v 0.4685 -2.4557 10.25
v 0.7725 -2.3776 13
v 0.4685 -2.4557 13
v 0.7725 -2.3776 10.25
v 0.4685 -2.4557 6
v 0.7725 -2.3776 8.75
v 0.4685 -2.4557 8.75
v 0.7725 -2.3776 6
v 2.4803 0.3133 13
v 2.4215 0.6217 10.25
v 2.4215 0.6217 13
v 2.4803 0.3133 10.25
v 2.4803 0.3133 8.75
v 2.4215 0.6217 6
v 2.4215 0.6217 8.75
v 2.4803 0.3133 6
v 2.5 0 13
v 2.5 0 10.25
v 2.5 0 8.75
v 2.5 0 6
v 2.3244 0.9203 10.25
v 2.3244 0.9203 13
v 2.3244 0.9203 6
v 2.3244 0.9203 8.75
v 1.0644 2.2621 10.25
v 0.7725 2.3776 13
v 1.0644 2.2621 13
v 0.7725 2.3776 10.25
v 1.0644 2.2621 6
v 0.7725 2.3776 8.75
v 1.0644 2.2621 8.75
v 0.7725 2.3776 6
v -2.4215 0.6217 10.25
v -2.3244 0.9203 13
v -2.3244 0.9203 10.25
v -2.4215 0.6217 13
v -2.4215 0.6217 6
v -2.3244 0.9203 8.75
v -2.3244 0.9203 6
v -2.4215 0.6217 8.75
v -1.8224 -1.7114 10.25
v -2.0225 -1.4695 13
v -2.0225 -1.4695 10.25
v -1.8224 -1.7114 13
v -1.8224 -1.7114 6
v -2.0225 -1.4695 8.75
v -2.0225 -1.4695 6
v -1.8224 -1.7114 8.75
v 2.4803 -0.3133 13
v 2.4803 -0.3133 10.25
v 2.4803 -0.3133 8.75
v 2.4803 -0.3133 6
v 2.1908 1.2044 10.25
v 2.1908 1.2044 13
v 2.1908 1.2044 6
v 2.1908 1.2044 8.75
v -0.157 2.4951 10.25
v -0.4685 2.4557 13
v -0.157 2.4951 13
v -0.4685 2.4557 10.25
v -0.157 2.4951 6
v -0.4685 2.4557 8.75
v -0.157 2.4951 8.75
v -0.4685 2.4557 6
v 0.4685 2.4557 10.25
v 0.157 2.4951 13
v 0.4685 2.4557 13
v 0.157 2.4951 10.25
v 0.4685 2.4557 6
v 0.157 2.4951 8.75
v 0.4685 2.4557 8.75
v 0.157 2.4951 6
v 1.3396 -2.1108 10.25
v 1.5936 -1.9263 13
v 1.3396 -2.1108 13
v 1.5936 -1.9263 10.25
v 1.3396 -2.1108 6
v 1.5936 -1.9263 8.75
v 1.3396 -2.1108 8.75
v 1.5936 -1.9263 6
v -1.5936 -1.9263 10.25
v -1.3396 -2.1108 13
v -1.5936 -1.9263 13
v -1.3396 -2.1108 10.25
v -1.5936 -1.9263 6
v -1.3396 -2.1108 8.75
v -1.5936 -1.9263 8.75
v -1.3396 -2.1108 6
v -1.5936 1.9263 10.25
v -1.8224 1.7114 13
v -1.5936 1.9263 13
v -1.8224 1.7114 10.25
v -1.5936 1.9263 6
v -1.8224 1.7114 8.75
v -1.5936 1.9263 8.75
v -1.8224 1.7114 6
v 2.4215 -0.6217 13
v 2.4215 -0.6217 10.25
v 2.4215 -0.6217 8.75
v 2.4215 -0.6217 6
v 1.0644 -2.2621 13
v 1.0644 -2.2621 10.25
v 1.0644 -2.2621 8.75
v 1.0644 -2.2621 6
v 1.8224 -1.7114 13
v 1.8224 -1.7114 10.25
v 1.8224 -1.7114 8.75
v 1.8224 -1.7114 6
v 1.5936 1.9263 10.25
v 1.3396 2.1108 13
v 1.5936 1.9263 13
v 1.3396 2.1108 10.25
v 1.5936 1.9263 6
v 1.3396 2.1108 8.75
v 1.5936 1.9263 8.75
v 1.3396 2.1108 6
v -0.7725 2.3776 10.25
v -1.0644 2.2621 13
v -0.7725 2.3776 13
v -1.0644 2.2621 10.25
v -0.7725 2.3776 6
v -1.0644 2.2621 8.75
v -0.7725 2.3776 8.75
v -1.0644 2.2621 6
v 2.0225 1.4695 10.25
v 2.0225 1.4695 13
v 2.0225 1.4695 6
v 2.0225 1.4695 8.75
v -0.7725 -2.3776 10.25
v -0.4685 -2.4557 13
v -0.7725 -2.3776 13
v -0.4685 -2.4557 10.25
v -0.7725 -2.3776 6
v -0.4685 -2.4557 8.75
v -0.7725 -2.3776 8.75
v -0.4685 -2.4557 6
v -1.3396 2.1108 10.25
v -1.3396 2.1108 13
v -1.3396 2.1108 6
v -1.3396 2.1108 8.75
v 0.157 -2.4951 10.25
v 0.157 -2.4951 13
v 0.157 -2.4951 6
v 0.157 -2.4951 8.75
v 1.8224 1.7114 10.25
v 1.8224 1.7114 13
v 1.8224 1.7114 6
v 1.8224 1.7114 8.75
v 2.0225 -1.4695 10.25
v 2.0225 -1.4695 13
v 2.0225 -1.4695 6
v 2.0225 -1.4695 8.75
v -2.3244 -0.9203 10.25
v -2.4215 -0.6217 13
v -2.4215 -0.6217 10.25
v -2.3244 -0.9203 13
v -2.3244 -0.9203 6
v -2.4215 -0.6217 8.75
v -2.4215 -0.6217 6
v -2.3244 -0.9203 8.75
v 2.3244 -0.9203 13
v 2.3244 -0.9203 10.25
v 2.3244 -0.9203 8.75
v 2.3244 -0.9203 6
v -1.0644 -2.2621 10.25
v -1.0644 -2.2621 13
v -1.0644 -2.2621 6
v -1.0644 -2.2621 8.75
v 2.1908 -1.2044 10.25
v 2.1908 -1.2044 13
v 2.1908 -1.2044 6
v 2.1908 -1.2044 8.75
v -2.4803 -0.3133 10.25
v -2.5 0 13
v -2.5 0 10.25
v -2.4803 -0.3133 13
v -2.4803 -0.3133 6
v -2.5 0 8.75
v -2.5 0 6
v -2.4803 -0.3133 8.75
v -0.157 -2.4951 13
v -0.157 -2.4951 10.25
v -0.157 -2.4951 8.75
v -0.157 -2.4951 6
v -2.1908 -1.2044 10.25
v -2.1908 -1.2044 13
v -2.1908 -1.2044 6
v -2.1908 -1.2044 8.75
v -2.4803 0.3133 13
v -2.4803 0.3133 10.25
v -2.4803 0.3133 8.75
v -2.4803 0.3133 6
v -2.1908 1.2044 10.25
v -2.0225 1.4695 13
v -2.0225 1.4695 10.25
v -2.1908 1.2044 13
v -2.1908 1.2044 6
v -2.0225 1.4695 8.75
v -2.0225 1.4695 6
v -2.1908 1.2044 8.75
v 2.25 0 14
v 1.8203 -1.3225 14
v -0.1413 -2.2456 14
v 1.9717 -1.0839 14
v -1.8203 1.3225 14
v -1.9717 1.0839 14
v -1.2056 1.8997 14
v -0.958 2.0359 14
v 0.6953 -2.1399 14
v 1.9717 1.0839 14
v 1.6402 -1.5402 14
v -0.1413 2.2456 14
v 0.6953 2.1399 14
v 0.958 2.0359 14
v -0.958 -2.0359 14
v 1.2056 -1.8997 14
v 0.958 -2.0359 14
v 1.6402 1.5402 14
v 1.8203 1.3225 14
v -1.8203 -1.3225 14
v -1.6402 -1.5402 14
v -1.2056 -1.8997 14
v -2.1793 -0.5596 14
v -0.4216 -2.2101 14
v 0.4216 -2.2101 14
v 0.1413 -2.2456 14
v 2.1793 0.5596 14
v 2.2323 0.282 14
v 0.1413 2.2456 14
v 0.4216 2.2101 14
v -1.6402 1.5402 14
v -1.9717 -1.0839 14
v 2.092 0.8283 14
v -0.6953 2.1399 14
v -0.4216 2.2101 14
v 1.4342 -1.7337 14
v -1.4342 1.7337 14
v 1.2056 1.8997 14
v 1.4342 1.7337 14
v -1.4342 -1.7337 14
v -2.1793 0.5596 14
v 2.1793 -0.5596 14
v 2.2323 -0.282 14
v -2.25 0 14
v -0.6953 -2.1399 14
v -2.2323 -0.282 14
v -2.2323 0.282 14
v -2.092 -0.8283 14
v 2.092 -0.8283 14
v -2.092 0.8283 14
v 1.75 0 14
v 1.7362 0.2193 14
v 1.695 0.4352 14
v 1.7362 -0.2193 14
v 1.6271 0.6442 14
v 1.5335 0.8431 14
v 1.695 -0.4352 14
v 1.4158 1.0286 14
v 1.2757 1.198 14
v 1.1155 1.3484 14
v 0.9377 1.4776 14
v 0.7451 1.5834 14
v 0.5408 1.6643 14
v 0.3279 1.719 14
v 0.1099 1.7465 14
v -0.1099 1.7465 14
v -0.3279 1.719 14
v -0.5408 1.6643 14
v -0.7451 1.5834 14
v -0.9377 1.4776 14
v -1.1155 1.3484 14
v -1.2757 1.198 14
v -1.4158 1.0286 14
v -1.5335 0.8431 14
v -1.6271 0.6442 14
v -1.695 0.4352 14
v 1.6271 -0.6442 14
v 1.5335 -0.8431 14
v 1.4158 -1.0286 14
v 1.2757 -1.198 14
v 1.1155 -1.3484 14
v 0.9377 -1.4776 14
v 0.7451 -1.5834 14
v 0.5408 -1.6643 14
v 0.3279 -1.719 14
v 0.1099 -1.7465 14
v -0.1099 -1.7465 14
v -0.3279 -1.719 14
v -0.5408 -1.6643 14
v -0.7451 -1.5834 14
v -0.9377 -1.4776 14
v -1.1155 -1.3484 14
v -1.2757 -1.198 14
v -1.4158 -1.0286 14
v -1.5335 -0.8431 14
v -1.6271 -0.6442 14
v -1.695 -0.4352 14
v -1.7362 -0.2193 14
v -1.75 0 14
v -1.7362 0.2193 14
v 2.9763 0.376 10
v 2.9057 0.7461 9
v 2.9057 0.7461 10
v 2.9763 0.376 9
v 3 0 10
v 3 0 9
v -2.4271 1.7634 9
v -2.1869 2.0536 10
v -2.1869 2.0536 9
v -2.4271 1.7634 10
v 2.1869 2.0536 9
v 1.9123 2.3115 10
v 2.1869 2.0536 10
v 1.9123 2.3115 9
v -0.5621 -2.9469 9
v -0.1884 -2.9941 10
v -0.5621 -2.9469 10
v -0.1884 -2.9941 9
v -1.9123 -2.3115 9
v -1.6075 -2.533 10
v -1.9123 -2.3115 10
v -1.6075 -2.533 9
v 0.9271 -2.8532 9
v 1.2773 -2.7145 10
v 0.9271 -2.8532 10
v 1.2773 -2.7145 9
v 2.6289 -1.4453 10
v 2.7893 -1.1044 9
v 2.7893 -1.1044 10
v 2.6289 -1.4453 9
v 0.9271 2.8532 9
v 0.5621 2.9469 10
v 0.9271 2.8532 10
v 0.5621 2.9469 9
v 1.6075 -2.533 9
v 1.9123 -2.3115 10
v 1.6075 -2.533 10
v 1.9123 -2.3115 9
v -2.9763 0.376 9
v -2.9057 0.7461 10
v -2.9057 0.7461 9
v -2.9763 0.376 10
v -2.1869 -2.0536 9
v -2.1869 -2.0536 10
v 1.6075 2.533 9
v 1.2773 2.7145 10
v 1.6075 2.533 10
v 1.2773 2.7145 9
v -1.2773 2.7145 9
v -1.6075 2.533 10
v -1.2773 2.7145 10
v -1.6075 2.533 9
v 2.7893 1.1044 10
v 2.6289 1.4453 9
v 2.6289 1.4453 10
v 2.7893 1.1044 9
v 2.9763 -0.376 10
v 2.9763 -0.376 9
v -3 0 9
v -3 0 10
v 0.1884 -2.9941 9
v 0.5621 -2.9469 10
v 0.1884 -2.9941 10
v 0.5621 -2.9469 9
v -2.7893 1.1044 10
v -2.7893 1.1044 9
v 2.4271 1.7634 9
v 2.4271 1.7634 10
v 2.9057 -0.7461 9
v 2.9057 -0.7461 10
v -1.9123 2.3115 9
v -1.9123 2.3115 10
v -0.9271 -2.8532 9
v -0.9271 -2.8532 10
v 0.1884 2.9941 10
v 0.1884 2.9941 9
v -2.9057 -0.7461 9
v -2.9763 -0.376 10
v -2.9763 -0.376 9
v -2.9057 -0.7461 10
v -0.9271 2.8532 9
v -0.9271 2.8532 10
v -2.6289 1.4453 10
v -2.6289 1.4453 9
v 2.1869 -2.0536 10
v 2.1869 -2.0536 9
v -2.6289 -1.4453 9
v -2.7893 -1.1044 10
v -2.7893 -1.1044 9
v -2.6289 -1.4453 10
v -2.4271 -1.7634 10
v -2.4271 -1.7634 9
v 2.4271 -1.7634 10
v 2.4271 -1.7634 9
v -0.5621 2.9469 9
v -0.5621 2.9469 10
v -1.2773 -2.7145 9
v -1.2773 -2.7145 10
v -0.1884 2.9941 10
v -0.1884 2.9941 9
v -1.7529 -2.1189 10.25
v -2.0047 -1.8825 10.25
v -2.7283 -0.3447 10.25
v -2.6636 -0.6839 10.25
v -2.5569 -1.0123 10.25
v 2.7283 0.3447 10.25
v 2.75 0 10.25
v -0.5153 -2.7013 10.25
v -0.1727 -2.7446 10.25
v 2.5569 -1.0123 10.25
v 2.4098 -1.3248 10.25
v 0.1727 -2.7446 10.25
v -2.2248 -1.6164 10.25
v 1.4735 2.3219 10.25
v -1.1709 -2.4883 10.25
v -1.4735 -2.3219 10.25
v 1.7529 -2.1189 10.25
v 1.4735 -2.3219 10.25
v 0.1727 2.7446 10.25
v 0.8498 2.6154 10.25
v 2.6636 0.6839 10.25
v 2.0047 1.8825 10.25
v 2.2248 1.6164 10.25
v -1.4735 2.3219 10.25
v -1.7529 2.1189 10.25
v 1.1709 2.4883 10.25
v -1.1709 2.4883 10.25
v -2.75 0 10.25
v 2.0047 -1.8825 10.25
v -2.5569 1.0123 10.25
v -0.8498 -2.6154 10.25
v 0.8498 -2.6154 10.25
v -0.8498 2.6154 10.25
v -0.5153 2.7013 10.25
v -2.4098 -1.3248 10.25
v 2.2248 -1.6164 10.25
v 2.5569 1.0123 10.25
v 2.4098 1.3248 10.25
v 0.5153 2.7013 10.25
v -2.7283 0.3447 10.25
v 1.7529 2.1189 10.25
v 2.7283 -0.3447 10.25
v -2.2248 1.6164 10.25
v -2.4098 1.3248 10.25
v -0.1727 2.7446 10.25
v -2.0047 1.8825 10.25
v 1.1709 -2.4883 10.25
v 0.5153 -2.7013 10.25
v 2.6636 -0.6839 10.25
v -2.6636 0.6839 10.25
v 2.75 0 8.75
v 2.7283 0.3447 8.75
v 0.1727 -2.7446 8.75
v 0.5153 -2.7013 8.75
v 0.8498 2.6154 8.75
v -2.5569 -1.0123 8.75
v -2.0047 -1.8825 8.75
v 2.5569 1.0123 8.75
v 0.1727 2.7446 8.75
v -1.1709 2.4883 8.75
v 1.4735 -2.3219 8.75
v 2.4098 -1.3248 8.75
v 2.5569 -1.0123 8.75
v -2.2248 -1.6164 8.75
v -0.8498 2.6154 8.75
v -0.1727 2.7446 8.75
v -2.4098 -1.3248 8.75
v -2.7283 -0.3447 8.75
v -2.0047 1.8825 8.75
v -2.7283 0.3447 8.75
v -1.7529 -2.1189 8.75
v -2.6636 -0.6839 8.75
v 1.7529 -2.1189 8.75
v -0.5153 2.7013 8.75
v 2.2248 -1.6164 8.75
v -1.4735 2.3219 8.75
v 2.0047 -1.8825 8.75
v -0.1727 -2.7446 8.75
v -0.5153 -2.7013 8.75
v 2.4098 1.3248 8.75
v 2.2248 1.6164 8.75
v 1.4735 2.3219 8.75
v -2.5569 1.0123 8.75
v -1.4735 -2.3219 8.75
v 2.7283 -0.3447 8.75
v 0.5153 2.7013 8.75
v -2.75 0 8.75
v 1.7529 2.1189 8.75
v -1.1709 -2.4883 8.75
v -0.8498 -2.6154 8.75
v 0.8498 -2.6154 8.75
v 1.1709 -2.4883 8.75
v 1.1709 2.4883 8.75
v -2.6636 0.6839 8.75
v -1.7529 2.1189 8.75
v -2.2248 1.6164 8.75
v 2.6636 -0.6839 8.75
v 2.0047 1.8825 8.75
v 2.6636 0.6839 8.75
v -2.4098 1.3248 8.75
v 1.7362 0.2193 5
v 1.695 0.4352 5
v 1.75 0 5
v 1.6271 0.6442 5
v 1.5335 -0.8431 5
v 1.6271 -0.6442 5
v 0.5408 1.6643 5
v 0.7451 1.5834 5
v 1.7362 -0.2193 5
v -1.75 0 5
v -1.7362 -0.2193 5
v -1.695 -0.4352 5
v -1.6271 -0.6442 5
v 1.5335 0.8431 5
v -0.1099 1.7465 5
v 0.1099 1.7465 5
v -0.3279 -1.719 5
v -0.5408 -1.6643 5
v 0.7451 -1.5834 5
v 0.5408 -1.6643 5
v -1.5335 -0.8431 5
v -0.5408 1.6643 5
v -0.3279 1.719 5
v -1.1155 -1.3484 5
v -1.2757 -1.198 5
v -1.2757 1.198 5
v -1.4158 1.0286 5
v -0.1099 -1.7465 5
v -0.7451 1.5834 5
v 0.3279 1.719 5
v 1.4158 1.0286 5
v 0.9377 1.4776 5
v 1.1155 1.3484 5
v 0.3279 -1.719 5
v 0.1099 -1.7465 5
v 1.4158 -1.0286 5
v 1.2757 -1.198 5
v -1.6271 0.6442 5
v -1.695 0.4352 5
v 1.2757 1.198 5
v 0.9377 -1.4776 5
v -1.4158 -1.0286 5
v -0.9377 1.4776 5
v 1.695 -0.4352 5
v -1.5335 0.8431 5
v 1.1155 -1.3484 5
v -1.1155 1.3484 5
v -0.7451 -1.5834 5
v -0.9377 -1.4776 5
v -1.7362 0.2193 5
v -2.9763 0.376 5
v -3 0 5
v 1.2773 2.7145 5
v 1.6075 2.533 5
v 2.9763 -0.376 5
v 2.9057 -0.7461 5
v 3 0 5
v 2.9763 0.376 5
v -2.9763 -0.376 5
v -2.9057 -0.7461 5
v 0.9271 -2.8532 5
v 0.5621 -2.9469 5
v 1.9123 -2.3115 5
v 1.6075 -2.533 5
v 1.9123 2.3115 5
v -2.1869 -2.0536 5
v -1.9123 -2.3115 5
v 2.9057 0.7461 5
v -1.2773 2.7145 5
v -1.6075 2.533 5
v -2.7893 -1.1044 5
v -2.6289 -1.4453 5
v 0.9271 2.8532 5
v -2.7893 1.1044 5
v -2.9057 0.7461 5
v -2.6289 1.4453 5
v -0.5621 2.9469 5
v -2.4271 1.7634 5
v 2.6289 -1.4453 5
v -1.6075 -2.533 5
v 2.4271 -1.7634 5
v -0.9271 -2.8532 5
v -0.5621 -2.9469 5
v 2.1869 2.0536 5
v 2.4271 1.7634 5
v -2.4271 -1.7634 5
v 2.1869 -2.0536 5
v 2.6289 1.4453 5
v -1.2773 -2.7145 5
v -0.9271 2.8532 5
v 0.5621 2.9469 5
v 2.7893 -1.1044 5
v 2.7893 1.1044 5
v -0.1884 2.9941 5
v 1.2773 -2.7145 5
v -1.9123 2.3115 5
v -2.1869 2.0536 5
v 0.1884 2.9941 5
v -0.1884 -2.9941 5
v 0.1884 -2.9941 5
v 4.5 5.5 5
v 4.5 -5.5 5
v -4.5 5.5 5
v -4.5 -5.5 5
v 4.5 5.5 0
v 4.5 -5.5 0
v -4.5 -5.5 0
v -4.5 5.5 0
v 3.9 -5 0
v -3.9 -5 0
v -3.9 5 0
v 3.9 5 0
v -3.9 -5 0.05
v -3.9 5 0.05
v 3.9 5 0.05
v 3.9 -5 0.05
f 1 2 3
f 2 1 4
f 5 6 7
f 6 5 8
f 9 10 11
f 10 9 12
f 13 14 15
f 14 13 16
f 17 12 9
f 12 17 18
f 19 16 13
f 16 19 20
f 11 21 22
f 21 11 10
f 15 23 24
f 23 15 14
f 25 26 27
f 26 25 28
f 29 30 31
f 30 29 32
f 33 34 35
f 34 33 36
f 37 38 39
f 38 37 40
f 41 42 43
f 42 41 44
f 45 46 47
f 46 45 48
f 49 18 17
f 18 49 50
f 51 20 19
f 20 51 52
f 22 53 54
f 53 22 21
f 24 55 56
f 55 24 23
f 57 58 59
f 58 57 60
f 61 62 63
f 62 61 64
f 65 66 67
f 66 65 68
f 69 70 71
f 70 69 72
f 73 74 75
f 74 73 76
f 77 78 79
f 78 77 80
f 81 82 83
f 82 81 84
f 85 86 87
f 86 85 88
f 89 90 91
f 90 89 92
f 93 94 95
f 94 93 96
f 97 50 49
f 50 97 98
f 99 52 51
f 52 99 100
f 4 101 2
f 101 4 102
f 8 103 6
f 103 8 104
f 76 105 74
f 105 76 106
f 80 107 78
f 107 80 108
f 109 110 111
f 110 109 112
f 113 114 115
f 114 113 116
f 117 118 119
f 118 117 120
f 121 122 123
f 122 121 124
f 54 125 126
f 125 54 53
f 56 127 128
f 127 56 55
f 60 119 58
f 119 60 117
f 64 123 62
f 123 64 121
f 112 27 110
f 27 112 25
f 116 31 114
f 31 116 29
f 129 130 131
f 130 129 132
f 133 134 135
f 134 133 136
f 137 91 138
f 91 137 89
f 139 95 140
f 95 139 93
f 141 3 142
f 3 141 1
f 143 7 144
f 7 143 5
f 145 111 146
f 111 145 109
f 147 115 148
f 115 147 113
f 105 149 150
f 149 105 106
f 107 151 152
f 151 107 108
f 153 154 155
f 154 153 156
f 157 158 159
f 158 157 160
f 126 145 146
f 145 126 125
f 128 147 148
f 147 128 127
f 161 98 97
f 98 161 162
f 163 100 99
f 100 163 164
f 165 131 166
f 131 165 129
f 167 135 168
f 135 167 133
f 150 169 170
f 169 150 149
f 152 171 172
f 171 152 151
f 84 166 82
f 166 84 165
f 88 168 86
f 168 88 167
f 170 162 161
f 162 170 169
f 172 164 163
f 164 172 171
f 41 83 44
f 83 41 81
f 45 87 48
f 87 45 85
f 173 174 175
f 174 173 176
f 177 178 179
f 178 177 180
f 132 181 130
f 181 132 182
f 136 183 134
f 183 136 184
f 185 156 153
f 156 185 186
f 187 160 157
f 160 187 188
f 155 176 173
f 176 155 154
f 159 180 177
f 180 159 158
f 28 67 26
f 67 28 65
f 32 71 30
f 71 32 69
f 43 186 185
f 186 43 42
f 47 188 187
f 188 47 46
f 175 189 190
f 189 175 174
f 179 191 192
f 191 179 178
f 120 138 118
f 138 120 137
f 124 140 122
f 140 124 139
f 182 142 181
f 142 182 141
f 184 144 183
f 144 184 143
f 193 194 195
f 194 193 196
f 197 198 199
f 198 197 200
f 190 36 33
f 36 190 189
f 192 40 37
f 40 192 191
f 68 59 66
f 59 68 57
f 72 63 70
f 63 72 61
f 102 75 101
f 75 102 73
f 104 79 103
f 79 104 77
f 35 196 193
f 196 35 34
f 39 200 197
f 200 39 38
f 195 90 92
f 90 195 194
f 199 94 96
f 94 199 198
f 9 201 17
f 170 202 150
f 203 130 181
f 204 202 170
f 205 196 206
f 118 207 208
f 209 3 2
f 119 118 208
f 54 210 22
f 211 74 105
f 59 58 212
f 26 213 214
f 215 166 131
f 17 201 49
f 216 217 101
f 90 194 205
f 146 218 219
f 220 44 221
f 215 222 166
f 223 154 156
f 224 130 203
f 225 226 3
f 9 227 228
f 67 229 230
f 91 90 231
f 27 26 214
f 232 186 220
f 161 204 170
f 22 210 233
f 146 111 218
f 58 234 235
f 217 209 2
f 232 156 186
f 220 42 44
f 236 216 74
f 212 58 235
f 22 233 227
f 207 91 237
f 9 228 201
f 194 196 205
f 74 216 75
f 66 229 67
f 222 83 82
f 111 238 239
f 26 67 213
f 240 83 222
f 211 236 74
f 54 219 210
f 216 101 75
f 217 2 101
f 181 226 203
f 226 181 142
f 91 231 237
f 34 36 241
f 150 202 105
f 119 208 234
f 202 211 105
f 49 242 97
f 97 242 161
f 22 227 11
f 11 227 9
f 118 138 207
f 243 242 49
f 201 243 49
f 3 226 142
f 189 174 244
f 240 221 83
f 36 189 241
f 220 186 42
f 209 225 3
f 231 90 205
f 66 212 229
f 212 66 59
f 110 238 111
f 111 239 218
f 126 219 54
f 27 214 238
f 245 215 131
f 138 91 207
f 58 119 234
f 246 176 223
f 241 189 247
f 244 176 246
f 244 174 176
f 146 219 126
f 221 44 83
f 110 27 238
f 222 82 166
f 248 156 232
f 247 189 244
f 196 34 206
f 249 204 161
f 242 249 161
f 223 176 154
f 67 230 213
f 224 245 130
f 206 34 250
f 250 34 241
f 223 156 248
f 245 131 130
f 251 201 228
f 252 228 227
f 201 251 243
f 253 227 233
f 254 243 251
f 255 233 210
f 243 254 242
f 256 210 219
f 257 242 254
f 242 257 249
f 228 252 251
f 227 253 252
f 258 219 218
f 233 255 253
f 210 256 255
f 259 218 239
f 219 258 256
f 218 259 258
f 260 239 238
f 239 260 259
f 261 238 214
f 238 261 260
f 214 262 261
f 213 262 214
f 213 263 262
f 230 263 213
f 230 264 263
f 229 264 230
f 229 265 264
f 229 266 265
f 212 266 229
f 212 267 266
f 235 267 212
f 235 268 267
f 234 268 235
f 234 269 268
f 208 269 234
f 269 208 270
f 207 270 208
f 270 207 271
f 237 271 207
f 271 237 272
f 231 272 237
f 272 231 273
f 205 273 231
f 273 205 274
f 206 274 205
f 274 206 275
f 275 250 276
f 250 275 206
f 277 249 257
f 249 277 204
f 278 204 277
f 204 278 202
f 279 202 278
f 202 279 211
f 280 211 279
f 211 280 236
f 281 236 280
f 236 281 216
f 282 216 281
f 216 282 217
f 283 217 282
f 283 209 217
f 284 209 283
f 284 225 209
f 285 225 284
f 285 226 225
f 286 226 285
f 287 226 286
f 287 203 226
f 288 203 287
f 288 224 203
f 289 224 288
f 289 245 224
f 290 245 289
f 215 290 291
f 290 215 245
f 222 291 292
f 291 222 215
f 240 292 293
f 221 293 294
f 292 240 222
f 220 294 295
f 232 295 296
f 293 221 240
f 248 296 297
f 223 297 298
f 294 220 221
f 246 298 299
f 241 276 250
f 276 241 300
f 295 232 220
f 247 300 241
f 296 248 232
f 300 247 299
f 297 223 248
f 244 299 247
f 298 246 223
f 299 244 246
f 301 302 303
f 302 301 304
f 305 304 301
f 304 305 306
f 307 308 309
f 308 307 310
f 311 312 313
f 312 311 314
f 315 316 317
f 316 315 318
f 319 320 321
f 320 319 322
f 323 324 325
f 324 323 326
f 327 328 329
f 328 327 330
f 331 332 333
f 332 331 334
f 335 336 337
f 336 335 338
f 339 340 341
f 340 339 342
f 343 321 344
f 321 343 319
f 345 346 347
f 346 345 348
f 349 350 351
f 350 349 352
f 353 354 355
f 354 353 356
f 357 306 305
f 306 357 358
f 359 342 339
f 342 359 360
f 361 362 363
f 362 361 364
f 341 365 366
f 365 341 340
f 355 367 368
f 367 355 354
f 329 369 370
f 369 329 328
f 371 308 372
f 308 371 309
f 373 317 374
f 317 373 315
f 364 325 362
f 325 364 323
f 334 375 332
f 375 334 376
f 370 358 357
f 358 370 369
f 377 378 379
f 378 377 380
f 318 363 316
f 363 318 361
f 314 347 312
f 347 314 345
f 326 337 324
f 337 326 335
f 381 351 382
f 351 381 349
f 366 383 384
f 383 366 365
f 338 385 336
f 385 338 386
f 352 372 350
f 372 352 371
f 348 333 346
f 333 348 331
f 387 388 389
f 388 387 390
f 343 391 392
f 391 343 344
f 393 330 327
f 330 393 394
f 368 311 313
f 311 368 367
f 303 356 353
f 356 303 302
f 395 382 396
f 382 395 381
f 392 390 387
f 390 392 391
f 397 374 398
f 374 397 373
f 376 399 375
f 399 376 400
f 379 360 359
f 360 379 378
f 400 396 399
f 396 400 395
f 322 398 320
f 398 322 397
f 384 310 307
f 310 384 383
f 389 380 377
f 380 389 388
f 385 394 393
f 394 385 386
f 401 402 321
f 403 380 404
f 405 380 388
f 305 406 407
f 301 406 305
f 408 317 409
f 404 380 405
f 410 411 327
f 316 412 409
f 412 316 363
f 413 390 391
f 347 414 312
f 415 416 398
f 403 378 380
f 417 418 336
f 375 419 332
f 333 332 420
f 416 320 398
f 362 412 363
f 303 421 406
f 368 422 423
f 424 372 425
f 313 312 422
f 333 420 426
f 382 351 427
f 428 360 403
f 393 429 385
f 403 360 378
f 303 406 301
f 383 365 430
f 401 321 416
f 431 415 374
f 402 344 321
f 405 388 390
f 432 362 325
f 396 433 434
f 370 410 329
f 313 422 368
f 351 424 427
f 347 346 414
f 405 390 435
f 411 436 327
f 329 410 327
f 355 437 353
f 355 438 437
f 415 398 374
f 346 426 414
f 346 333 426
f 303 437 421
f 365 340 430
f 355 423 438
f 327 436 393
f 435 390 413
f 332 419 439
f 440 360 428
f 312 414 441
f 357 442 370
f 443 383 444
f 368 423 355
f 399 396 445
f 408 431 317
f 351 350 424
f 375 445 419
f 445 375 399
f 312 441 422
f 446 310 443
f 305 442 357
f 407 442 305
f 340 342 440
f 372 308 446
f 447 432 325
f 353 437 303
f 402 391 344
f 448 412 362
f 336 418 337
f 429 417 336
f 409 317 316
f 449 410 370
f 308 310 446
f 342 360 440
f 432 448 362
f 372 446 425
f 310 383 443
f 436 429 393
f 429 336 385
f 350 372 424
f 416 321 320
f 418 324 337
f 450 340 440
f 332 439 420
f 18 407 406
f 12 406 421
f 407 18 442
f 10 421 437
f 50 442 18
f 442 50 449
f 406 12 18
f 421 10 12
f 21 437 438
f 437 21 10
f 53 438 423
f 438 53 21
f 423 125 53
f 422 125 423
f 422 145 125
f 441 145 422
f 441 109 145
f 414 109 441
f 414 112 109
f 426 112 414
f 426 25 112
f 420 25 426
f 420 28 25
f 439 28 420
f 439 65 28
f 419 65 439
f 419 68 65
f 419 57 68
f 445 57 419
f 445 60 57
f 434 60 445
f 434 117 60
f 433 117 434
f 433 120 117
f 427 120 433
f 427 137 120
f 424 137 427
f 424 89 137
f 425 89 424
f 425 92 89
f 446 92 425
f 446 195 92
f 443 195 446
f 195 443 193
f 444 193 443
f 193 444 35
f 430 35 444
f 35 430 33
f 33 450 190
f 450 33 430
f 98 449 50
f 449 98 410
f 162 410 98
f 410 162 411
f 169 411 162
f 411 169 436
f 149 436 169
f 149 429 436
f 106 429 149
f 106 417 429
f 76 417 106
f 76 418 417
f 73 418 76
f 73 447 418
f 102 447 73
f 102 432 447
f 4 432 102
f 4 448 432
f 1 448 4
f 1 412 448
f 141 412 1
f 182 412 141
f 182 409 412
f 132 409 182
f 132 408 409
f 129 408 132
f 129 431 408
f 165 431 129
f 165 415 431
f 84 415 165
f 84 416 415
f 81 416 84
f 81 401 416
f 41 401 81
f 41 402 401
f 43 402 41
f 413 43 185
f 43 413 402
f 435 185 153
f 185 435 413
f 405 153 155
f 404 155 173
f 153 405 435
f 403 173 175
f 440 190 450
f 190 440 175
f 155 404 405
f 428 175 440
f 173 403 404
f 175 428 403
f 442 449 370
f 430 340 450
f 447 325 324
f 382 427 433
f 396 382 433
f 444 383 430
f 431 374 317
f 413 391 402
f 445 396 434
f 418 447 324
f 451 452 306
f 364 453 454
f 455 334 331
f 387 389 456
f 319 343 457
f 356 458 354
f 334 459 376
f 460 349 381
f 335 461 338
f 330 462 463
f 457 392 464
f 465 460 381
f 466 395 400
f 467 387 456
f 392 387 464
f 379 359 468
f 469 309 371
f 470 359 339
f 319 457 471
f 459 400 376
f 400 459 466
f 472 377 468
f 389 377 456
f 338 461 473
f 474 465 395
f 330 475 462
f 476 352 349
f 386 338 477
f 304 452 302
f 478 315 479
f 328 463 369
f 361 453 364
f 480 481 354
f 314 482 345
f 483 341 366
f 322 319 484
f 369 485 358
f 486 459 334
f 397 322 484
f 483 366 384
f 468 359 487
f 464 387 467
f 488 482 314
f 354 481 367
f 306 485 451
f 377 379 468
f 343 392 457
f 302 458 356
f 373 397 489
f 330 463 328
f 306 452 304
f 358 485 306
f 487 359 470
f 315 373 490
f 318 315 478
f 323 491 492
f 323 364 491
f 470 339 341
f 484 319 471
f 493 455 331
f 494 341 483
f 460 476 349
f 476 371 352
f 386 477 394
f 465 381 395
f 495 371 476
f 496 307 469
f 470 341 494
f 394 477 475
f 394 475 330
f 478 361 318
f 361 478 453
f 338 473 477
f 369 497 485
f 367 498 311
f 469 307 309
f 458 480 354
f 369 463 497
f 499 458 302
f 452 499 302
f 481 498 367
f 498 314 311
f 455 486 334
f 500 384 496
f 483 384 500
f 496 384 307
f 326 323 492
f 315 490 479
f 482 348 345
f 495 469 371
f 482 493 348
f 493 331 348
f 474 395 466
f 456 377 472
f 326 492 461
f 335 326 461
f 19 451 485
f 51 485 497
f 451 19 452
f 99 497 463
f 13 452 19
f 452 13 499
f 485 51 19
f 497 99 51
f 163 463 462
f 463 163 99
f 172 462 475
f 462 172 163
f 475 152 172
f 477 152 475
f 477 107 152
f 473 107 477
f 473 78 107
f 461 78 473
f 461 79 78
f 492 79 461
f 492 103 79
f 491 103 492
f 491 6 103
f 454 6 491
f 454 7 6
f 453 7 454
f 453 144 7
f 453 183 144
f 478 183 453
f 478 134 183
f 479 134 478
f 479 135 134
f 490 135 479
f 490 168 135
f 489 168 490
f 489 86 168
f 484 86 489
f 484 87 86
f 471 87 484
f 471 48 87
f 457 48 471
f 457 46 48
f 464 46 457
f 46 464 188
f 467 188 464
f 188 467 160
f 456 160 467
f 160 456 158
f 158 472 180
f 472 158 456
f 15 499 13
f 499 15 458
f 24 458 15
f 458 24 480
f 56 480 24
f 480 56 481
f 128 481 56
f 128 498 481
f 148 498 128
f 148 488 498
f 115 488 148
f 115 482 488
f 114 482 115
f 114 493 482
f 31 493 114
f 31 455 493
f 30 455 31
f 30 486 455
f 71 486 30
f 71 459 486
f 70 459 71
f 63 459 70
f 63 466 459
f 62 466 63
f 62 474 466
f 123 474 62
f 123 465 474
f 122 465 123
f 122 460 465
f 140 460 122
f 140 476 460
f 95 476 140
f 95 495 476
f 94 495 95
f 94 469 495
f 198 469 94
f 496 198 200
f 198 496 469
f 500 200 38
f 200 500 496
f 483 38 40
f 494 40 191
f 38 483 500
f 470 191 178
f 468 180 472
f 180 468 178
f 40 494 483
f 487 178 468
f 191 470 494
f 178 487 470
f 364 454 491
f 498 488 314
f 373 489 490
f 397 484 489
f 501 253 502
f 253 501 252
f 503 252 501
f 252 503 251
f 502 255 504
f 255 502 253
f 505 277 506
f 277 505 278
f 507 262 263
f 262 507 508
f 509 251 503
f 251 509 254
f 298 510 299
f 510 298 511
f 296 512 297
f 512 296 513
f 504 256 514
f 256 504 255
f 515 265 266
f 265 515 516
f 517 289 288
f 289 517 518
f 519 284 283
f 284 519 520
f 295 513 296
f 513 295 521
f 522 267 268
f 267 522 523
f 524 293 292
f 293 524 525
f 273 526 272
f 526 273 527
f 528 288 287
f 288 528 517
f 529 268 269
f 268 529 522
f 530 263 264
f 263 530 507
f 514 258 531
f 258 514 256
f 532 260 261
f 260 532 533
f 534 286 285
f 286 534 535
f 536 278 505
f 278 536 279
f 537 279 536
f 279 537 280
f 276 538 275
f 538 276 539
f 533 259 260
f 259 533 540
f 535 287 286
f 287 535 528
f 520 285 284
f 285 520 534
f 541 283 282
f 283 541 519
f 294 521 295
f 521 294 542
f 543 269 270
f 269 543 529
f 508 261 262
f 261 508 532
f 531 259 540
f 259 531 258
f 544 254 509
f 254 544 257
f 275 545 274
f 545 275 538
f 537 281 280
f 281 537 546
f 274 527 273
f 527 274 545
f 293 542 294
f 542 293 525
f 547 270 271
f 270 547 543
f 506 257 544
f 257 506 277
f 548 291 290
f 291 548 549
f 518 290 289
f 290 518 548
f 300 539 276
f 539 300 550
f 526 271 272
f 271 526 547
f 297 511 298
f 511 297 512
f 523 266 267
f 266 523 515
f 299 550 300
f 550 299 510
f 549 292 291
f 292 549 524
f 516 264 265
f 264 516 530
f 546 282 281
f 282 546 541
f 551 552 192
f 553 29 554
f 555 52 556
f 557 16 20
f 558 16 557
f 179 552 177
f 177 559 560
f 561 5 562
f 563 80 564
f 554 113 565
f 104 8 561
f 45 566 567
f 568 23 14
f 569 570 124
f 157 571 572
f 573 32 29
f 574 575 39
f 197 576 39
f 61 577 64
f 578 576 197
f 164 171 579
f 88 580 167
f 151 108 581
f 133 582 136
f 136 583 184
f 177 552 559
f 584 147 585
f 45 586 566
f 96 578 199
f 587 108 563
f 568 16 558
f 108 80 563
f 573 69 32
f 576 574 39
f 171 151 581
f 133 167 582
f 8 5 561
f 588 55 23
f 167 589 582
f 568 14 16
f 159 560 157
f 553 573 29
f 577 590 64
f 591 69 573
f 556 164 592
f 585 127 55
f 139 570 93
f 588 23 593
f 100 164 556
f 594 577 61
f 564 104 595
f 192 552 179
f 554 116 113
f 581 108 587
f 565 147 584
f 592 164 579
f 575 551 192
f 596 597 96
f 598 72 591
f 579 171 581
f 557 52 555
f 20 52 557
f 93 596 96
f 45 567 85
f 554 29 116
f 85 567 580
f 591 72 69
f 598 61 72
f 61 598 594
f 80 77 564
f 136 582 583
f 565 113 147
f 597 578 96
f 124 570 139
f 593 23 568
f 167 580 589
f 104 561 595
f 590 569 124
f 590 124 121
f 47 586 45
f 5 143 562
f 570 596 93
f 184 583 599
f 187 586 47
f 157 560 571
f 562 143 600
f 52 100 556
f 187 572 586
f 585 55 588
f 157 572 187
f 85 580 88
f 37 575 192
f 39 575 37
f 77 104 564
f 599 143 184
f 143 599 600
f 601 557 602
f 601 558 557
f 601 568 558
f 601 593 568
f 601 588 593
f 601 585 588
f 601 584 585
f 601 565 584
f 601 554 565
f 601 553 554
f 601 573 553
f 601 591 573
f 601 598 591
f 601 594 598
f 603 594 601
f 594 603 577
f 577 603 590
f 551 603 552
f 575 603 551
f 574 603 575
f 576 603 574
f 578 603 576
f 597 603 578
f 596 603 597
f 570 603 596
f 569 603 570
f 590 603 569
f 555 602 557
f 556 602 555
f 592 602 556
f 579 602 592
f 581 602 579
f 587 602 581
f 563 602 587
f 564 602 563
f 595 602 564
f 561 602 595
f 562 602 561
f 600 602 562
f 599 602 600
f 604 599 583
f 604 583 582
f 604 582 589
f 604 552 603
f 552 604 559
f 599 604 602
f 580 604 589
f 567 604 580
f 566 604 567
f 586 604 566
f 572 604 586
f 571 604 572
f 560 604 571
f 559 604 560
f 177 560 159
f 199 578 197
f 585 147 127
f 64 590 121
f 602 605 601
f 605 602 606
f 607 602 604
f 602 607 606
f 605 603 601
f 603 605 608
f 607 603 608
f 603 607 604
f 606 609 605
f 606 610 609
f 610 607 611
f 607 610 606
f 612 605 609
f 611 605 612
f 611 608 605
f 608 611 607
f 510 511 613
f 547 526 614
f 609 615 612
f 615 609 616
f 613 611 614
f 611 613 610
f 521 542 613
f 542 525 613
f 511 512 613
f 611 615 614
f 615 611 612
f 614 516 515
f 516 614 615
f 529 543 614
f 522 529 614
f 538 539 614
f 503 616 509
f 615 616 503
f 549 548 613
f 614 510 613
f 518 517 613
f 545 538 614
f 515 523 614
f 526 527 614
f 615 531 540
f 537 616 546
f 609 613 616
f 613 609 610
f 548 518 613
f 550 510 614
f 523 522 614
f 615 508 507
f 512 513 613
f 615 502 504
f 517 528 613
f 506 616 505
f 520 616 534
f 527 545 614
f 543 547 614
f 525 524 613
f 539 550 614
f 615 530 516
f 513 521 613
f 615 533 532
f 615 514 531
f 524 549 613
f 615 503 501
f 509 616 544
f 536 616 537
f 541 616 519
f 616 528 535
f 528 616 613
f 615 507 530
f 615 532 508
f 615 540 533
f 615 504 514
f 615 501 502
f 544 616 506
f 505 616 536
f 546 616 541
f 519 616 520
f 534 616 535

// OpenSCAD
$fn=50;

/*PumpHoseAdapter by Mattis Männel
This is a hose adapter for pmumps. It was designed for http://www.thingiverse.com/thing:4881 but should be configureable for any size. Unfortunatly you'll have to merge the adapter to the pump manually in 3D-Design software which is able to load STL-file (i can personally recommend Blender for this purposes). 
*/

/* [Hose Adapter (Idigo, (and Purple, just for length)] */
hose_adapter_length = 9;
inner_diameter = 3.5; 
outer_diameter = 5;

/* [Size] */
width=9;    //9
length=11;   //5
height=5;  //11
hoppper_width=7.8;   
hopper_height=10;   

/* [Ring of the hose mount (Lime)] */
postion_of_the_ring = 4;
ring_diameter = 6;
ring_height = 1;
ring_bevel_difference = 0.5;
ring_bevel_height = 0.25;

/* [Hose adapters' end bevel (Light Purple)] */
end_bevel_differnce = 0.5;
end_bevel_length = 1;

/* [Hose mount guide (Deep Purple)] */
hose_mount_guide_factor = 1;
hose_mount_guide_length = 1;
hose_mount_wall_thickness_top = 0;
hose_mount_wall_thickness_bottom = 1;




module hoseAdapter()
{
    difference()
    {
        /// Don't forget it's rotated by 90° in x-direction later
        union()
        {
            color("Cyan")translate([0,height/2,0])cube([width,height,length],center=true);
            //hose mount guide
            color("MidnightBlue")translate([0,height,0])rotate([270,0,0])difference()
            {
                cylinder(hose_mount_guide_length,d1=outer_diameter * hose_mount_guide_factor + hose_mount_wall_thickness_bottom, d2=outer_diameter * hose_mount_guide_factor +hose_mount_wall_thickness_top);
                cylinder(hose_mount_guide_length,d=outer_diameter * hose_mount_guide_factor);
            }
        }
        
        //hopper
        color("SkyBlue")hull()
        {
            //circle(d=10);
            translate([0,height,0])rotate([90,0,0])cylinder(0.01,d=inner_diameter);
            cube([hoppper_width,.1,hopper_height],center=true);
        }
        //cut through the hose mount guide
        color("DarkSlateGray")translate([0,5,0])rotate([-90,0,0])translate([0,0,-1 ])cylinder(length+1,d=inner_diameter);
    }
    
    
}

module hoseMount()
{
    difference()
    {
        union()
        {
            color("Indigo")cylinder(hose_adapter_length-end_bevel_length,d=outer_diameter);
            color("Purple")translate([0,0,hose_adapter_length-end_bevel_length])cylinder(end_bevel_length,d1=outer_diameter,d2=outer_diameter-end_bevel_differnce);
            color("Lime")translate([0,0,postion_of_the_ring ])cylinder(ring_height,d=ring_diameter);
            color("Lime")translate([0,0,postion_of_the_ring + ring_height])cylinder(ring_bevel_height,d1=ring_diameter,d2=ring_diameter - ring_bevel_difference);
            color("Lime")translate([0,0,postion_of_the_ring - ring_bevel_height])cylinder(ring_bevel_height,d2=ring_diameter,d1=ring_diameter - ring_bevel_difference);
        }
        color("DarkSlateGray")translate([0,0,-0.4 ])cylinder(hose_adapter_length+1,d=inner_diameter);
    }
}

        
translate([0,0,height])hoseMount();
rotate([90,0,0])hoseAdapter();
